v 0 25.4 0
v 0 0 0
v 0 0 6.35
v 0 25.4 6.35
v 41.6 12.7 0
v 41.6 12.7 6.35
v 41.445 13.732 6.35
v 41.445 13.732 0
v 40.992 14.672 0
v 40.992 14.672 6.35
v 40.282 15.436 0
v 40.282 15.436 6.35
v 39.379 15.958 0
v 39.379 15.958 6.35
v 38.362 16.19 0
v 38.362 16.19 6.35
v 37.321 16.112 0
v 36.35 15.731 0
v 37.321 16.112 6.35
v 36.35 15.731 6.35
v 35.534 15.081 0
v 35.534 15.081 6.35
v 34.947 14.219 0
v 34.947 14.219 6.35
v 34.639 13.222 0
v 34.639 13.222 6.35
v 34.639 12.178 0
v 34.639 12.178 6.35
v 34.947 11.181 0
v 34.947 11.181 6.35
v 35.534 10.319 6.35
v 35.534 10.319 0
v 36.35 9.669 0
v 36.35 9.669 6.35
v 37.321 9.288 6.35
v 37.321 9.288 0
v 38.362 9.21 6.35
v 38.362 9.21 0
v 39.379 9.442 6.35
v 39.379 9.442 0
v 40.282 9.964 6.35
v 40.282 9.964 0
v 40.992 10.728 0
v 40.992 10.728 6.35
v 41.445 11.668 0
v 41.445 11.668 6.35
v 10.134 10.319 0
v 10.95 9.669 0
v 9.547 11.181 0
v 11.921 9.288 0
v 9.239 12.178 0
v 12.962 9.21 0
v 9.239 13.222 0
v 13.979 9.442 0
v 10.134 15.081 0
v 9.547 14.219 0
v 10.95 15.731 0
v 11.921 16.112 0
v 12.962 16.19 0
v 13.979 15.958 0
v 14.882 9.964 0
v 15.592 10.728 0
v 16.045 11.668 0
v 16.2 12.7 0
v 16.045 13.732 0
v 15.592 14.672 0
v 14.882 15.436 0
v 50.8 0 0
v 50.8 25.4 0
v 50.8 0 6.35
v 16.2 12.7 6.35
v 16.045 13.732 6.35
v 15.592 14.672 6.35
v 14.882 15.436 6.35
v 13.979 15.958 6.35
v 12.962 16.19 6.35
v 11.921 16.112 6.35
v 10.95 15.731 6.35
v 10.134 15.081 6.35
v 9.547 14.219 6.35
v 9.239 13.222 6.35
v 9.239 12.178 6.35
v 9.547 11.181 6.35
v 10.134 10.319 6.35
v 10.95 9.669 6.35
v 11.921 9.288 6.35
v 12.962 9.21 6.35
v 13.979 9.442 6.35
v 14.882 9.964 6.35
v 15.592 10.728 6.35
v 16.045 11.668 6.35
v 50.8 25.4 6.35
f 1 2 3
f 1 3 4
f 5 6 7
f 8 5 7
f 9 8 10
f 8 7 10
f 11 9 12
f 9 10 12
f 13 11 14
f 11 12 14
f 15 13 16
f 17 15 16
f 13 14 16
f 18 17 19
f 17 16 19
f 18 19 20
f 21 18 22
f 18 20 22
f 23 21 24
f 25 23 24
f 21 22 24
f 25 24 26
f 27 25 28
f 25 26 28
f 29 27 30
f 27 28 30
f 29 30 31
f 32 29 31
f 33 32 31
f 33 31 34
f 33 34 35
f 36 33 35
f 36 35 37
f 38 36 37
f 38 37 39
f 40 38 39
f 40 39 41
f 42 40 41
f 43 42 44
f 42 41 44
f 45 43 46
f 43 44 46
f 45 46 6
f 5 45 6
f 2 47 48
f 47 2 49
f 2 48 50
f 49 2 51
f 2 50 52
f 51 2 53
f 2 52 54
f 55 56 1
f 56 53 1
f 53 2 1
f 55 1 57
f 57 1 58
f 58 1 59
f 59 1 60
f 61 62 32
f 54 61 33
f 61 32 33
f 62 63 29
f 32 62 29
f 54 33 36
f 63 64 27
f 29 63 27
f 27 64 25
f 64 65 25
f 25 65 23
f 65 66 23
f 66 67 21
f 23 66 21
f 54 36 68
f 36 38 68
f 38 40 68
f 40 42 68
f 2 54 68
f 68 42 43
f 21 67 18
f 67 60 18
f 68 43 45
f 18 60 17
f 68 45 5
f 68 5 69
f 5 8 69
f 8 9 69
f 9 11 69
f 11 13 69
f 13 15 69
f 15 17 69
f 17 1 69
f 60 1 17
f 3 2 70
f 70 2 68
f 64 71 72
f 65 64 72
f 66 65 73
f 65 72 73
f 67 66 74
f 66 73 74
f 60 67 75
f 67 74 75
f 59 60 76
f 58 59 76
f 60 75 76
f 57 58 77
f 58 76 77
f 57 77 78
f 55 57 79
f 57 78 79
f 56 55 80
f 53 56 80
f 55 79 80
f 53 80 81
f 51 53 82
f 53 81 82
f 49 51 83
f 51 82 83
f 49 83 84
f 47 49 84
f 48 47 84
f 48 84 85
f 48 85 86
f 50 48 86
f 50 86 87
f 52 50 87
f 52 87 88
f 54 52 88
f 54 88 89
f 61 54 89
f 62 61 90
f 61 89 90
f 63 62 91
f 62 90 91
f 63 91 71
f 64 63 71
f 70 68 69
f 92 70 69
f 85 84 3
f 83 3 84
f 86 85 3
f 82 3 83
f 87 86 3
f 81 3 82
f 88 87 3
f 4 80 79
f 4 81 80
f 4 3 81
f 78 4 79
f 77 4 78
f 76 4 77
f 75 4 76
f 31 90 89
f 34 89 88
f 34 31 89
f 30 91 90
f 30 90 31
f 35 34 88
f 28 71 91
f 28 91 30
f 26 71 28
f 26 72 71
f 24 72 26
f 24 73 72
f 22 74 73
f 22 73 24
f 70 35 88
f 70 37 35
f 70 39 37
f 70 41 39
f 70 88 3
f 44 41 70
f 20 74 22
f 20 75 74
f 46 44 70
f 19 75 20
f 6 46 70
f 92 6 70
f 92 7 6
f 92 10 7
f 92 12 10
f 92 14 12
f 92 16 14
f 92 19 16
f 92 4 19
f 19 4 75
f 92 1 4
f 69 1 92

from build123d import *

# Parameters (mm, degrees)
SKETCH1_W           = 50.8
SKETCH1_H           = 25.4
BOSS_EXTRUDE1_DEPTH = 6.35
SKETCH2_R           = 3.5
CUT_EXTRUDE1_DEPTH  = 6.35


with BuildPart() as part:
    # Sketch1 → Boss-Extrude1 (new body)
    with BuildSketch(Plane.XY):
        with Locations((25.4, 12.7)):
            Rectangle(SKETCH1_W, SKETCH1_H)
    extrude(amount=BOSS_EXTRUDE1_DEPTH)

    # Sketch2 → Cut-Extrude1 (cut)
    with BuildSketch(Plane.XY.offset(6.35)):
        with Locations((12.7, 12.7)):
            Circle(SKETCH2_R)
        with Locations((38.1, 12.7)):
            Circle(SKETCH2_R)
    extrude(amount=-CUT_EXTRUDE1_DEPTH, mode=Mode.SUBTRACT)


solid = part.part
